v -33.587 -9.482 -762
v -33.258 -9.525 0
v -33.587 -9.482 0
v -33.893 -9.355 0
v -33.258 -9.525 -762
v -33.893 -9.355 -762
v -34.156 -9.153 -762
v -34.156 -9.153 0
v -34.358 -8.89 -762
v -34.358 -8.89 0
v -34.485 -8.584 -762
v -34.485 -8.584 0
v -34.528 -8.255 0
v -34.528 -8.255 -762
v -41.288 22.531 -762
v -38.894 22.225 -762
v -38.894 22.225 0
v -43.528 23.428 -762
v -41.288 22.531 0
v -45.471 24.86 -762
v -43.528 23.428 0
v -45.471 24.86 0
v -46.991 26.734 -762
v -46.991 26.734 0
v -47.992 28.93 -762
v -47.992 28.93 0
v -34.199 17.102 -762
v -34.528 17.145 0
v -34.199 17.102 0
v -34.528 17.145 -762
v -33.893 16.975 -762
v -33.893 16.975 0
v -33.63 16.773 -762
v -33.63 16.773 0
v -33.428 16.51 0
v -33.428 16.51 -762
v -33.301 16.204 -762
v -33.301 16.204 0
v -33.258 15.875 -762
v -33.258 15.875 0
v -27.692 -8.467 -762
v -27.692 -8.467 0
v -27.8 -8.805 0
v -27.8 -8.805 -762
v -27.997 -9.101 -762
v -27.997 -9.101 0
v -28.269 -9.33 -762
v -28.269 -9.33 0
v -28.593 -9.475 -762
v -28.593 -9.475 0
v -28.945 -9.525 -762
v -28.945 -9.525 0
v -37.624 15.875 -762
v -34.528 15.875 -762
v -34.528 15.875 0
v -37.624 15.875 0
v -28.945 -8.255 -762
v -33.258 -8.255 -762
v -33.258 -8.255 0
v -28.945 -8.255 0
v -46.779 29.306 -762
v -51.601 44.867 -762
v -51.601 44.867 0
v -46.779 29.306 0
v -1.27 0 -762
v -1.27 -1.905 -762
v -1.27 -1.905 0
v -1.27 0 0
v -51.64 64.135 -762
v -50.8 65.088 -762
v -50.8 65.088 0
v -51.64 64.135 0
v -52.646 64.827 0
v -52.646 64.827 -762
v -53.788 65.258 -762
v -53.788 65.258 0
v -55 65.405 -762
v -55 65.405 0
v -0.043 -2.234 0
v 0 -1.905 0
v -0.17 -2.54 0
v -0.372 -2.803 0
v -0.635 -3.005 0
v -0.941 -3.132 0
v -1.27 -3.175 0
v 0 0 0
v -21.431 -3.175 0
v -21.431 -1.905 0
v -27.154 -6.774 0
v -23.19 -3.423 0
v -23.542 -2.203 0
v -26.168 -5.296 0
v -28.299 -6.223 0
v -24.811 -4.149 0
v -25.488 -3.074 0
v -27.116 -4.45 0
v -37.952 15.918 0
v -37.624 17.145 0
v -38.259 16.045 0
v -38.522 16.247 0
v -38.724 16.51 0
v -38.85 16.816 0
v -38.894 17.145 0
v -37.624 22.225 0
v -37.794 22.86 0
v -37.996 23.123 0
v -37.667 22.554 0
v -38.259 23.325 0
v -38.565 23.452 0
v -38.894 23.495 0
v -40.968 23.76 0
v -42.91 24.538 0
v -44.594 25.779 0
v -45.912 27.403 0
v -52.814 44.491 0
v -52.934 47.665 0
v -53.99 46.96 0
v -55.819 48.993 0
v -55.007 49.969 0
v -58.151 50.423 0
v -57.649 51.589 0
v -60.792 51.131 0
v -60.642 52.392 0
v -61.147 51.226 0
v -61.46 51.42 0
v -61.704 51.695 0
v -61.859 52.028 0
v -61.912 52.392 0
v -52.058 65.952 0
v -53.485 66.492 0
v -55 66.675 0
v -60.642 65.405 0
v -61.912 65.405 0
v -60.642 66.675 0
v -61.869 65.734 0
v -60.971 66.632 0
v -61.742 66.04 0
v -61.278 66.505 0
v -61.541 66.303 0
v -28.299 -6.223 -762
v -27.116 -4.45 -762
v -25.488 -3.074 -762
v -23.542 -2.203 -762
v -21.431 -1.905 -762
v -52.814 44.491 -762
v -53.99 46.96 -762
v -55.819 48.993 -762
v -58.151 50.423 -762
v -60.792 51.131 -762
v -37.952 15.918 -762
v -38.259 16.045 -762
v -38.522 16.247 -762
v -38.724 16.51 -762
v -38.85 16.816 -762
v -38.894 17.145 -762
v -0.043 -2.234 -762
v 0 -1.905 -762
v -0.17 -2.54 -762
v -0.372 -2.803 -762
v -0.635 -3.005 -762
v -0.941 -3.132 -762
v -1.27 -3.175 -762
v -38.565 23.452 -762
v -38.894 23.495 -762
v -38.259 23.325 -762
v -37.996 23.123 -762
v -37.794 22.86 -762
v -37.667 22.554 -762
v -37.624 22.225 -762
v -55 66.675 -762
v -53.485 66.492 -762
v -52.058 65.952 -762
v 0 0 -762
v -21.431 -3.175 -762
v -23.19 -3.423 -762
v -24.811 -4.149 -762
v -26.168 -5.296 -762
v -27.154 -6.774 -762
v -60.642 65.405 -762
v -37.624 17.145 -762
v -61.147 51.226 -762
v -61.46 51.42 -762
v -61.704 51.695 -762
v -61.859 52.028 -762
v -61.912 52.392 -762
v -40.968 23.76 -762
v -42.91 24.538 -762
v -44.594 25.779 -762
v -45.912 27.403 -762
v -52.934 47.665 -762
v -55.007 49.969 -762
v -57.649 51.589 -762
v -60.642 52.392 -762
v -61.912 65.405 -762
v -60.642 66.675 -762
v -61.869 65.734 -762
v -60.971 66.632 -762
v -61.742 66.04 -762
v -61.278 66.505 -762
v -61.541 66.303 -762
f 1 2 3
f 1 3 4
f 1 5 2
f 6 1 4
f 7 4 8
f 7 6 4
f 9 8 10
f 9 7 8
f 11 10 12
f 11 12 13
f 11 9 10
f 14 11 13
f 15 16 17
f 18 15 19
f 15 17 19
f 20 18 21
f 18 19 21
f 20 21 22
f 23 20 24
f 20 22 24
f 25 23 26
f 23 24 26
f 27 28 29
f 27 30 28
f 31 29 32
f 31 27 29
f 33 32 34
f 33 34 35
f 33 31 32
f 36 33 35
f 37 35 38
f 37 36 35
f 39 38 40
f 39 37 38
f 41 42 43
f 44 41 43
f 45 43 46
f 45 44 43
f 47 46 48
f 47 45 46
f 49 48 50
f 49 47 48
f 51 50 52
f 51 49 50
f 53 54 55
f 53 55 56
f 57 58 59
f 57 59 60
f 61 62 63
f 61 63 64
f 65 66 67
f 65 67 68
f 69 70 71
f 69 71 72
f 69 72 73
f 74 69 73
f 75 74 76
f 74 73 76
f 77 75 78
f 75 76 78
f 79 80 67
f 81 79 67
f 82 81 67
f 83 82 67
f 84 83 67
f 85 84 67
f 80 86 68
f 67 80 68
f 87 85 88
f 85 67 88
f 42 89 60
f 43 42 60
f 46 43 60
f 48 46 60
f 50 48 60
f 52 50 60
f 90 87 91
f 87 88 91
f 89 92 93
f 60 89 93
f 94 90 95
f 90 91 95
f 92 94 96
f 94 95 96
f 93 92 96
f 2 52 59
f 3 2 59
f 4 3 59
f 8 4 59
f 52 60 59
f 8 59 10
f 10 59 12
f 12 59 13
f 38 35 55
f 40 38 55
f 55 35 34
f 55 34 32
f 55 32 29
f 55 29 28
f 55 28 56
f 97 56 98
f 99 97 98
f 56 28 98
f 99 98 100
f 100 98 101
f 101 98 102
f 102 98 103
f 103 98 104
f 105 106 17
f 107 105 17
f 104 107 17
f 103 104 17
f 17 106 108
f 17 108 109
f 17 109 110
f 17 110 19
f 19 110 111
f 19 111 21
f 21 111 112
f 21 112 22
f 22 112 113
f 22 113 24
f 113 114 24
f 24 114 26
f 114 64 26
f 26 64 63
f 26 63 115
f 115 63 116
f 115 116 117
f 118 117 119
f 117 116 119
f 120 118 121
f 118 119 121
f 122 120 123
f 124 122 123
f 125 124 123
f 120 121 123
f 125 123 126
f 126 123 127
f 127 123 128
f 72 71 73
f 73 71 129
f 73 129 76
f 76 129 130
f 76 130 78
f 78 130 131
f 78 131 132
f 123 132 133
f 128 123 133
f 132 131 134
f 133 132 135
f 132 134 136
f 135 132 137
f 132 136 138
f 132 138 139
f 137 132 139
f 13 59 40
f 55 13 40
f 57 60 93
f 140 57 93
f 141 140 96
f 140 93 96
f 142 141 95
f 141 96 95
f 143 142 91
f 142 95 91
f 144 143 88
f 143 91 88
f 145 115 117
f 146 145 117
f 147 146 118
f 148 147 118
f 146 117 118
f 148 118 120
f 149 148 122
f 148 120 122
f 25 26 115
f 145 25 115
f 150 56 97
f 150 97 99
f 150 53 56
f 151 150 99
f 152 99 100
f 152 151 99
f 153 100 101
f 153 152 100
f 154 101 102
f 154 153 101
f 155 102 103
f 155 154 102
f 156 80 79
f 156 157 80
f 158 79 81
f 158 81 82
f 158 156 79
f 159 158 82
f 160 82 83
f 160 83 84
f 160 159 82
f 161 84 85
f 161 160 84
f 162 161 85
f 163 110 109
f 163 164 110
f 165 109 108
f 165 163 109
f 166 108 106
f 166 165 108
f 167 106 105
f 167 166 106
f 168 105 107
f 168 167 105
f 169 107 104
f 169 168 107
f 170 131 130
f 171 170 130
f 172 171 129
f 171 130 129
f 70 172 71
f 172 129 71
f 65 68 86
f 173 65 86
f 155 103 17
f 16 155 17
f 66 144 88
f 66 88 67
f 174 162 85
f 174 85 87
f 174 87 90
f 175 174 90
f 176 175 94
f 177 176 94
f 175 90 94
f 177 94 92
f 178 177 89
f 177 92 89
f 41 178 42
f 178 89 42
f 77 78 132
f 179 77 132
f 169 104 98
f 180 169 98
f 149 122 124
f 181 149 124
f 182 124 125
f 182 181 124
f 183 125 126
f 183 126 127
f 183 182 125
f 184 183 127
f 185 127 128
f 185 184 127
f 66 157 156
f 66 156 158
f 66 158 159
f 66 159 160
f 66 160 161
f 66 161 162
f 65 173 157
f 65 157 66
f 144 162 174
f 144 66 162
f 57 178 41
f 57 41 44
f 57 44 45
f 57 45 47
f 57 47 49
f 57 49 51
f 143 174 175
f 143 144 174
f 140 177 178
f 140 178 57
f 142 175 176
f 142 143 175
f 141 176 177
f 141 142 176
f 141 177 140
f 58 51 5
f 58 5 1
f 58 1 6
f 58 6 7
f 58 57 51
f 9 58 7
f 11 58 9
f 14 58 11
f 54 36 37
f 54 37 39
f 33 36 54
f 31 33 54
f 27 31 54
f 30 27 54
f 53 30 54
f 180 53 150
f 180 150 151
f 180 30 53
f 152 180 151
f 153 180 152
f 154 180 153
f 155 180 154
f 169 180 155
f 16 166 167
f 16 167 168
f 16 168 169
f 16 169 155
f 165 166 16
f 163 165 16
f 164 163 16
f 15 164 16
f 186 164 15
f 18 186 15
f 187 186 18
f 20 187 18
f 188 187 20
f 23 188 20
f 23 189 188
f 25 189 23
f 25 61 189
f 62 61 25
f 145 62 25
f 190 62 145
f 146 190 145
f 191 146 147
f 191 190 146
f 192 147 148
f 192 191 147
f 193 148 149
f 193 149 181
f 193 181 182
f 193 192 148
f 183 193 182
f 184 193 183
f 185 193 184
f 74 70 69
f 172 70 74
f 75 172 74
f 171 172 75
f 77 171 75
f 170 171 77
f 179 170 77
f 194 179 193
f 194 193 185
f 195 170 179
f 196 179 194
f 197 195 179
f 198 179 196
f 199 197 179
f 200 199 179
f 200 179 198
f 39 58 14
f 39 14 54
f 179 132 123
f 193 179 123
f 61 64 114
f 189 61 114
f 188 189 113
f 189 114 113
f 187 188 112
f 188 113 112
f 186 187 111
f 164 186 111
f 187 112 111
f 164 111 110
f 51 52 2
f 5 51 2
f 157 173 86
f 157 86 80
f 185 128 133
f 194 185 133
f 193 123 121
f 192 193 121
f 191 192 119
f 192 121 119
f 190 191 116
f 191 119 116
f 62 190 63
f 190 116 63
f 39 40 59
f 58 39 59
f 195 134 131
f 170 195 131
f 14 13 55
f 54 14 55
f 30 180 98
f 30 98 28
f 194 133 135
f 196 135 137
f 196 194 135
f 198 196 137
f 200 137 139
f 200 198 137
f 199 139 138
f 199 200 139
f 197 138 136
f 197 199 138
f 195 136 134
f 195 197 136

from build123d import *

# Parameters (mm, degrees)
EXTRUDE_THIN1_DEPTH = 762
FILLET1_R           = 1.27


with BuildPart() as part:
    # Sketch1 → Extrude-Thin1 (new body)
    with BuildSketch(Plane.XY):
        with BuildLine():
            Line((0, 0), (0, -3.175))
            Line((0, -3.175), (-21.43125, -3.175))
            ThreePointArc((-21.43125, -3.175), (-25.921378, -5.034872), (-27.78125, -9.525))
            Line((-27.78125, -9.525), (-34.528125, -9.525))
            Line((-34.528125, -9.525), (-34.528125, 15.875))
            Line((-34.528125, 15.875), (-38.89375, 15.875))
            Line((-38.89375, 15.875), (-38.89375, 22.225))
            ThreePointArc((-38.89375, 22.225), (-44.544809, 24.082461), (-47.991853, 28.9304))
            Line((-47.991853, 28.9304), (-52.814397, 44.491475))
            ThreePointArc((-52.814397, 44.491475), (-56.261441, 49.339414), (-61.9125, 51.196875))
            Line((-61.9125, 51.196875), (-61.9125, 66.675))
            Line((-61.9125, 66.675), (-55.00013, 66.675))
            ThreePointArc((-55.00013, 66.675), (-52.755066, 66.264881), (-50.8, 65.0875))
            Line((-50.8, 65.0875), (-51.640026, 64.135))
            ThreePointArc((-51.640026, 64.135), (-53.204079, 65.076905), (-55.00013, 65.405))
            Line((-55.00013, 65.405), (-60.6425, 65.405))
            Line((-60.6425, 65.405), (-60.6425, 52.391909))
            ThreePointArc((-60.6425, 52.391909), (-55.007036, 49.96926), (-51.601316, 44.867421))
            Line((-51.601316, 44.867421), (-46.778773, 29.306347))
            ThreePointArc((-46.778773, 29.306347), (-43.264039, 24.746743), (-37.62375, 23.593277))
            Line((-37.62375, 23.593277), (-37.62375, 17.145))
            Line((-37.62375, 17.145), (-33.258125, 17.145))
            Line((-33.258125, 17.145), (-33.258125, -8.255))
            Line((-33.258125, -8.255), (-28.944671, -8.255))
            ThreePointArc((-28.944671, -8.255), (-26.349939, -3.705129), (-21.43125, -1.905))
            Line((-21.43125, -1.905), (-1.27, -1.905))
            Line((-1.27, -1.905), (-1.27, 0))
            Line((-1.27, 0), (0, 0))
        make_face()
    extrude(amount=-EXTRUDE_THIN1_DEPTH)

    # Fillet1
    fillet1_edges = [part.edges().sort_by_distance(p)[0] for p in [
        (-37.62375, 23.593277, -381),
        (-33.258125, 17.145, -381),
        (0, -3.175, -381),
        (-27.78125, -9.525, -381),
        (-34.528125, -9.525, -381),
        (-38.89375, 15.875, -381),
        (-61.9125, 51.196875, -381),
        (-61.9125, 66.675, -381),
    ]]
    fillet(fillet1_edges, radius=FILLET1_R)


solid = part.part
